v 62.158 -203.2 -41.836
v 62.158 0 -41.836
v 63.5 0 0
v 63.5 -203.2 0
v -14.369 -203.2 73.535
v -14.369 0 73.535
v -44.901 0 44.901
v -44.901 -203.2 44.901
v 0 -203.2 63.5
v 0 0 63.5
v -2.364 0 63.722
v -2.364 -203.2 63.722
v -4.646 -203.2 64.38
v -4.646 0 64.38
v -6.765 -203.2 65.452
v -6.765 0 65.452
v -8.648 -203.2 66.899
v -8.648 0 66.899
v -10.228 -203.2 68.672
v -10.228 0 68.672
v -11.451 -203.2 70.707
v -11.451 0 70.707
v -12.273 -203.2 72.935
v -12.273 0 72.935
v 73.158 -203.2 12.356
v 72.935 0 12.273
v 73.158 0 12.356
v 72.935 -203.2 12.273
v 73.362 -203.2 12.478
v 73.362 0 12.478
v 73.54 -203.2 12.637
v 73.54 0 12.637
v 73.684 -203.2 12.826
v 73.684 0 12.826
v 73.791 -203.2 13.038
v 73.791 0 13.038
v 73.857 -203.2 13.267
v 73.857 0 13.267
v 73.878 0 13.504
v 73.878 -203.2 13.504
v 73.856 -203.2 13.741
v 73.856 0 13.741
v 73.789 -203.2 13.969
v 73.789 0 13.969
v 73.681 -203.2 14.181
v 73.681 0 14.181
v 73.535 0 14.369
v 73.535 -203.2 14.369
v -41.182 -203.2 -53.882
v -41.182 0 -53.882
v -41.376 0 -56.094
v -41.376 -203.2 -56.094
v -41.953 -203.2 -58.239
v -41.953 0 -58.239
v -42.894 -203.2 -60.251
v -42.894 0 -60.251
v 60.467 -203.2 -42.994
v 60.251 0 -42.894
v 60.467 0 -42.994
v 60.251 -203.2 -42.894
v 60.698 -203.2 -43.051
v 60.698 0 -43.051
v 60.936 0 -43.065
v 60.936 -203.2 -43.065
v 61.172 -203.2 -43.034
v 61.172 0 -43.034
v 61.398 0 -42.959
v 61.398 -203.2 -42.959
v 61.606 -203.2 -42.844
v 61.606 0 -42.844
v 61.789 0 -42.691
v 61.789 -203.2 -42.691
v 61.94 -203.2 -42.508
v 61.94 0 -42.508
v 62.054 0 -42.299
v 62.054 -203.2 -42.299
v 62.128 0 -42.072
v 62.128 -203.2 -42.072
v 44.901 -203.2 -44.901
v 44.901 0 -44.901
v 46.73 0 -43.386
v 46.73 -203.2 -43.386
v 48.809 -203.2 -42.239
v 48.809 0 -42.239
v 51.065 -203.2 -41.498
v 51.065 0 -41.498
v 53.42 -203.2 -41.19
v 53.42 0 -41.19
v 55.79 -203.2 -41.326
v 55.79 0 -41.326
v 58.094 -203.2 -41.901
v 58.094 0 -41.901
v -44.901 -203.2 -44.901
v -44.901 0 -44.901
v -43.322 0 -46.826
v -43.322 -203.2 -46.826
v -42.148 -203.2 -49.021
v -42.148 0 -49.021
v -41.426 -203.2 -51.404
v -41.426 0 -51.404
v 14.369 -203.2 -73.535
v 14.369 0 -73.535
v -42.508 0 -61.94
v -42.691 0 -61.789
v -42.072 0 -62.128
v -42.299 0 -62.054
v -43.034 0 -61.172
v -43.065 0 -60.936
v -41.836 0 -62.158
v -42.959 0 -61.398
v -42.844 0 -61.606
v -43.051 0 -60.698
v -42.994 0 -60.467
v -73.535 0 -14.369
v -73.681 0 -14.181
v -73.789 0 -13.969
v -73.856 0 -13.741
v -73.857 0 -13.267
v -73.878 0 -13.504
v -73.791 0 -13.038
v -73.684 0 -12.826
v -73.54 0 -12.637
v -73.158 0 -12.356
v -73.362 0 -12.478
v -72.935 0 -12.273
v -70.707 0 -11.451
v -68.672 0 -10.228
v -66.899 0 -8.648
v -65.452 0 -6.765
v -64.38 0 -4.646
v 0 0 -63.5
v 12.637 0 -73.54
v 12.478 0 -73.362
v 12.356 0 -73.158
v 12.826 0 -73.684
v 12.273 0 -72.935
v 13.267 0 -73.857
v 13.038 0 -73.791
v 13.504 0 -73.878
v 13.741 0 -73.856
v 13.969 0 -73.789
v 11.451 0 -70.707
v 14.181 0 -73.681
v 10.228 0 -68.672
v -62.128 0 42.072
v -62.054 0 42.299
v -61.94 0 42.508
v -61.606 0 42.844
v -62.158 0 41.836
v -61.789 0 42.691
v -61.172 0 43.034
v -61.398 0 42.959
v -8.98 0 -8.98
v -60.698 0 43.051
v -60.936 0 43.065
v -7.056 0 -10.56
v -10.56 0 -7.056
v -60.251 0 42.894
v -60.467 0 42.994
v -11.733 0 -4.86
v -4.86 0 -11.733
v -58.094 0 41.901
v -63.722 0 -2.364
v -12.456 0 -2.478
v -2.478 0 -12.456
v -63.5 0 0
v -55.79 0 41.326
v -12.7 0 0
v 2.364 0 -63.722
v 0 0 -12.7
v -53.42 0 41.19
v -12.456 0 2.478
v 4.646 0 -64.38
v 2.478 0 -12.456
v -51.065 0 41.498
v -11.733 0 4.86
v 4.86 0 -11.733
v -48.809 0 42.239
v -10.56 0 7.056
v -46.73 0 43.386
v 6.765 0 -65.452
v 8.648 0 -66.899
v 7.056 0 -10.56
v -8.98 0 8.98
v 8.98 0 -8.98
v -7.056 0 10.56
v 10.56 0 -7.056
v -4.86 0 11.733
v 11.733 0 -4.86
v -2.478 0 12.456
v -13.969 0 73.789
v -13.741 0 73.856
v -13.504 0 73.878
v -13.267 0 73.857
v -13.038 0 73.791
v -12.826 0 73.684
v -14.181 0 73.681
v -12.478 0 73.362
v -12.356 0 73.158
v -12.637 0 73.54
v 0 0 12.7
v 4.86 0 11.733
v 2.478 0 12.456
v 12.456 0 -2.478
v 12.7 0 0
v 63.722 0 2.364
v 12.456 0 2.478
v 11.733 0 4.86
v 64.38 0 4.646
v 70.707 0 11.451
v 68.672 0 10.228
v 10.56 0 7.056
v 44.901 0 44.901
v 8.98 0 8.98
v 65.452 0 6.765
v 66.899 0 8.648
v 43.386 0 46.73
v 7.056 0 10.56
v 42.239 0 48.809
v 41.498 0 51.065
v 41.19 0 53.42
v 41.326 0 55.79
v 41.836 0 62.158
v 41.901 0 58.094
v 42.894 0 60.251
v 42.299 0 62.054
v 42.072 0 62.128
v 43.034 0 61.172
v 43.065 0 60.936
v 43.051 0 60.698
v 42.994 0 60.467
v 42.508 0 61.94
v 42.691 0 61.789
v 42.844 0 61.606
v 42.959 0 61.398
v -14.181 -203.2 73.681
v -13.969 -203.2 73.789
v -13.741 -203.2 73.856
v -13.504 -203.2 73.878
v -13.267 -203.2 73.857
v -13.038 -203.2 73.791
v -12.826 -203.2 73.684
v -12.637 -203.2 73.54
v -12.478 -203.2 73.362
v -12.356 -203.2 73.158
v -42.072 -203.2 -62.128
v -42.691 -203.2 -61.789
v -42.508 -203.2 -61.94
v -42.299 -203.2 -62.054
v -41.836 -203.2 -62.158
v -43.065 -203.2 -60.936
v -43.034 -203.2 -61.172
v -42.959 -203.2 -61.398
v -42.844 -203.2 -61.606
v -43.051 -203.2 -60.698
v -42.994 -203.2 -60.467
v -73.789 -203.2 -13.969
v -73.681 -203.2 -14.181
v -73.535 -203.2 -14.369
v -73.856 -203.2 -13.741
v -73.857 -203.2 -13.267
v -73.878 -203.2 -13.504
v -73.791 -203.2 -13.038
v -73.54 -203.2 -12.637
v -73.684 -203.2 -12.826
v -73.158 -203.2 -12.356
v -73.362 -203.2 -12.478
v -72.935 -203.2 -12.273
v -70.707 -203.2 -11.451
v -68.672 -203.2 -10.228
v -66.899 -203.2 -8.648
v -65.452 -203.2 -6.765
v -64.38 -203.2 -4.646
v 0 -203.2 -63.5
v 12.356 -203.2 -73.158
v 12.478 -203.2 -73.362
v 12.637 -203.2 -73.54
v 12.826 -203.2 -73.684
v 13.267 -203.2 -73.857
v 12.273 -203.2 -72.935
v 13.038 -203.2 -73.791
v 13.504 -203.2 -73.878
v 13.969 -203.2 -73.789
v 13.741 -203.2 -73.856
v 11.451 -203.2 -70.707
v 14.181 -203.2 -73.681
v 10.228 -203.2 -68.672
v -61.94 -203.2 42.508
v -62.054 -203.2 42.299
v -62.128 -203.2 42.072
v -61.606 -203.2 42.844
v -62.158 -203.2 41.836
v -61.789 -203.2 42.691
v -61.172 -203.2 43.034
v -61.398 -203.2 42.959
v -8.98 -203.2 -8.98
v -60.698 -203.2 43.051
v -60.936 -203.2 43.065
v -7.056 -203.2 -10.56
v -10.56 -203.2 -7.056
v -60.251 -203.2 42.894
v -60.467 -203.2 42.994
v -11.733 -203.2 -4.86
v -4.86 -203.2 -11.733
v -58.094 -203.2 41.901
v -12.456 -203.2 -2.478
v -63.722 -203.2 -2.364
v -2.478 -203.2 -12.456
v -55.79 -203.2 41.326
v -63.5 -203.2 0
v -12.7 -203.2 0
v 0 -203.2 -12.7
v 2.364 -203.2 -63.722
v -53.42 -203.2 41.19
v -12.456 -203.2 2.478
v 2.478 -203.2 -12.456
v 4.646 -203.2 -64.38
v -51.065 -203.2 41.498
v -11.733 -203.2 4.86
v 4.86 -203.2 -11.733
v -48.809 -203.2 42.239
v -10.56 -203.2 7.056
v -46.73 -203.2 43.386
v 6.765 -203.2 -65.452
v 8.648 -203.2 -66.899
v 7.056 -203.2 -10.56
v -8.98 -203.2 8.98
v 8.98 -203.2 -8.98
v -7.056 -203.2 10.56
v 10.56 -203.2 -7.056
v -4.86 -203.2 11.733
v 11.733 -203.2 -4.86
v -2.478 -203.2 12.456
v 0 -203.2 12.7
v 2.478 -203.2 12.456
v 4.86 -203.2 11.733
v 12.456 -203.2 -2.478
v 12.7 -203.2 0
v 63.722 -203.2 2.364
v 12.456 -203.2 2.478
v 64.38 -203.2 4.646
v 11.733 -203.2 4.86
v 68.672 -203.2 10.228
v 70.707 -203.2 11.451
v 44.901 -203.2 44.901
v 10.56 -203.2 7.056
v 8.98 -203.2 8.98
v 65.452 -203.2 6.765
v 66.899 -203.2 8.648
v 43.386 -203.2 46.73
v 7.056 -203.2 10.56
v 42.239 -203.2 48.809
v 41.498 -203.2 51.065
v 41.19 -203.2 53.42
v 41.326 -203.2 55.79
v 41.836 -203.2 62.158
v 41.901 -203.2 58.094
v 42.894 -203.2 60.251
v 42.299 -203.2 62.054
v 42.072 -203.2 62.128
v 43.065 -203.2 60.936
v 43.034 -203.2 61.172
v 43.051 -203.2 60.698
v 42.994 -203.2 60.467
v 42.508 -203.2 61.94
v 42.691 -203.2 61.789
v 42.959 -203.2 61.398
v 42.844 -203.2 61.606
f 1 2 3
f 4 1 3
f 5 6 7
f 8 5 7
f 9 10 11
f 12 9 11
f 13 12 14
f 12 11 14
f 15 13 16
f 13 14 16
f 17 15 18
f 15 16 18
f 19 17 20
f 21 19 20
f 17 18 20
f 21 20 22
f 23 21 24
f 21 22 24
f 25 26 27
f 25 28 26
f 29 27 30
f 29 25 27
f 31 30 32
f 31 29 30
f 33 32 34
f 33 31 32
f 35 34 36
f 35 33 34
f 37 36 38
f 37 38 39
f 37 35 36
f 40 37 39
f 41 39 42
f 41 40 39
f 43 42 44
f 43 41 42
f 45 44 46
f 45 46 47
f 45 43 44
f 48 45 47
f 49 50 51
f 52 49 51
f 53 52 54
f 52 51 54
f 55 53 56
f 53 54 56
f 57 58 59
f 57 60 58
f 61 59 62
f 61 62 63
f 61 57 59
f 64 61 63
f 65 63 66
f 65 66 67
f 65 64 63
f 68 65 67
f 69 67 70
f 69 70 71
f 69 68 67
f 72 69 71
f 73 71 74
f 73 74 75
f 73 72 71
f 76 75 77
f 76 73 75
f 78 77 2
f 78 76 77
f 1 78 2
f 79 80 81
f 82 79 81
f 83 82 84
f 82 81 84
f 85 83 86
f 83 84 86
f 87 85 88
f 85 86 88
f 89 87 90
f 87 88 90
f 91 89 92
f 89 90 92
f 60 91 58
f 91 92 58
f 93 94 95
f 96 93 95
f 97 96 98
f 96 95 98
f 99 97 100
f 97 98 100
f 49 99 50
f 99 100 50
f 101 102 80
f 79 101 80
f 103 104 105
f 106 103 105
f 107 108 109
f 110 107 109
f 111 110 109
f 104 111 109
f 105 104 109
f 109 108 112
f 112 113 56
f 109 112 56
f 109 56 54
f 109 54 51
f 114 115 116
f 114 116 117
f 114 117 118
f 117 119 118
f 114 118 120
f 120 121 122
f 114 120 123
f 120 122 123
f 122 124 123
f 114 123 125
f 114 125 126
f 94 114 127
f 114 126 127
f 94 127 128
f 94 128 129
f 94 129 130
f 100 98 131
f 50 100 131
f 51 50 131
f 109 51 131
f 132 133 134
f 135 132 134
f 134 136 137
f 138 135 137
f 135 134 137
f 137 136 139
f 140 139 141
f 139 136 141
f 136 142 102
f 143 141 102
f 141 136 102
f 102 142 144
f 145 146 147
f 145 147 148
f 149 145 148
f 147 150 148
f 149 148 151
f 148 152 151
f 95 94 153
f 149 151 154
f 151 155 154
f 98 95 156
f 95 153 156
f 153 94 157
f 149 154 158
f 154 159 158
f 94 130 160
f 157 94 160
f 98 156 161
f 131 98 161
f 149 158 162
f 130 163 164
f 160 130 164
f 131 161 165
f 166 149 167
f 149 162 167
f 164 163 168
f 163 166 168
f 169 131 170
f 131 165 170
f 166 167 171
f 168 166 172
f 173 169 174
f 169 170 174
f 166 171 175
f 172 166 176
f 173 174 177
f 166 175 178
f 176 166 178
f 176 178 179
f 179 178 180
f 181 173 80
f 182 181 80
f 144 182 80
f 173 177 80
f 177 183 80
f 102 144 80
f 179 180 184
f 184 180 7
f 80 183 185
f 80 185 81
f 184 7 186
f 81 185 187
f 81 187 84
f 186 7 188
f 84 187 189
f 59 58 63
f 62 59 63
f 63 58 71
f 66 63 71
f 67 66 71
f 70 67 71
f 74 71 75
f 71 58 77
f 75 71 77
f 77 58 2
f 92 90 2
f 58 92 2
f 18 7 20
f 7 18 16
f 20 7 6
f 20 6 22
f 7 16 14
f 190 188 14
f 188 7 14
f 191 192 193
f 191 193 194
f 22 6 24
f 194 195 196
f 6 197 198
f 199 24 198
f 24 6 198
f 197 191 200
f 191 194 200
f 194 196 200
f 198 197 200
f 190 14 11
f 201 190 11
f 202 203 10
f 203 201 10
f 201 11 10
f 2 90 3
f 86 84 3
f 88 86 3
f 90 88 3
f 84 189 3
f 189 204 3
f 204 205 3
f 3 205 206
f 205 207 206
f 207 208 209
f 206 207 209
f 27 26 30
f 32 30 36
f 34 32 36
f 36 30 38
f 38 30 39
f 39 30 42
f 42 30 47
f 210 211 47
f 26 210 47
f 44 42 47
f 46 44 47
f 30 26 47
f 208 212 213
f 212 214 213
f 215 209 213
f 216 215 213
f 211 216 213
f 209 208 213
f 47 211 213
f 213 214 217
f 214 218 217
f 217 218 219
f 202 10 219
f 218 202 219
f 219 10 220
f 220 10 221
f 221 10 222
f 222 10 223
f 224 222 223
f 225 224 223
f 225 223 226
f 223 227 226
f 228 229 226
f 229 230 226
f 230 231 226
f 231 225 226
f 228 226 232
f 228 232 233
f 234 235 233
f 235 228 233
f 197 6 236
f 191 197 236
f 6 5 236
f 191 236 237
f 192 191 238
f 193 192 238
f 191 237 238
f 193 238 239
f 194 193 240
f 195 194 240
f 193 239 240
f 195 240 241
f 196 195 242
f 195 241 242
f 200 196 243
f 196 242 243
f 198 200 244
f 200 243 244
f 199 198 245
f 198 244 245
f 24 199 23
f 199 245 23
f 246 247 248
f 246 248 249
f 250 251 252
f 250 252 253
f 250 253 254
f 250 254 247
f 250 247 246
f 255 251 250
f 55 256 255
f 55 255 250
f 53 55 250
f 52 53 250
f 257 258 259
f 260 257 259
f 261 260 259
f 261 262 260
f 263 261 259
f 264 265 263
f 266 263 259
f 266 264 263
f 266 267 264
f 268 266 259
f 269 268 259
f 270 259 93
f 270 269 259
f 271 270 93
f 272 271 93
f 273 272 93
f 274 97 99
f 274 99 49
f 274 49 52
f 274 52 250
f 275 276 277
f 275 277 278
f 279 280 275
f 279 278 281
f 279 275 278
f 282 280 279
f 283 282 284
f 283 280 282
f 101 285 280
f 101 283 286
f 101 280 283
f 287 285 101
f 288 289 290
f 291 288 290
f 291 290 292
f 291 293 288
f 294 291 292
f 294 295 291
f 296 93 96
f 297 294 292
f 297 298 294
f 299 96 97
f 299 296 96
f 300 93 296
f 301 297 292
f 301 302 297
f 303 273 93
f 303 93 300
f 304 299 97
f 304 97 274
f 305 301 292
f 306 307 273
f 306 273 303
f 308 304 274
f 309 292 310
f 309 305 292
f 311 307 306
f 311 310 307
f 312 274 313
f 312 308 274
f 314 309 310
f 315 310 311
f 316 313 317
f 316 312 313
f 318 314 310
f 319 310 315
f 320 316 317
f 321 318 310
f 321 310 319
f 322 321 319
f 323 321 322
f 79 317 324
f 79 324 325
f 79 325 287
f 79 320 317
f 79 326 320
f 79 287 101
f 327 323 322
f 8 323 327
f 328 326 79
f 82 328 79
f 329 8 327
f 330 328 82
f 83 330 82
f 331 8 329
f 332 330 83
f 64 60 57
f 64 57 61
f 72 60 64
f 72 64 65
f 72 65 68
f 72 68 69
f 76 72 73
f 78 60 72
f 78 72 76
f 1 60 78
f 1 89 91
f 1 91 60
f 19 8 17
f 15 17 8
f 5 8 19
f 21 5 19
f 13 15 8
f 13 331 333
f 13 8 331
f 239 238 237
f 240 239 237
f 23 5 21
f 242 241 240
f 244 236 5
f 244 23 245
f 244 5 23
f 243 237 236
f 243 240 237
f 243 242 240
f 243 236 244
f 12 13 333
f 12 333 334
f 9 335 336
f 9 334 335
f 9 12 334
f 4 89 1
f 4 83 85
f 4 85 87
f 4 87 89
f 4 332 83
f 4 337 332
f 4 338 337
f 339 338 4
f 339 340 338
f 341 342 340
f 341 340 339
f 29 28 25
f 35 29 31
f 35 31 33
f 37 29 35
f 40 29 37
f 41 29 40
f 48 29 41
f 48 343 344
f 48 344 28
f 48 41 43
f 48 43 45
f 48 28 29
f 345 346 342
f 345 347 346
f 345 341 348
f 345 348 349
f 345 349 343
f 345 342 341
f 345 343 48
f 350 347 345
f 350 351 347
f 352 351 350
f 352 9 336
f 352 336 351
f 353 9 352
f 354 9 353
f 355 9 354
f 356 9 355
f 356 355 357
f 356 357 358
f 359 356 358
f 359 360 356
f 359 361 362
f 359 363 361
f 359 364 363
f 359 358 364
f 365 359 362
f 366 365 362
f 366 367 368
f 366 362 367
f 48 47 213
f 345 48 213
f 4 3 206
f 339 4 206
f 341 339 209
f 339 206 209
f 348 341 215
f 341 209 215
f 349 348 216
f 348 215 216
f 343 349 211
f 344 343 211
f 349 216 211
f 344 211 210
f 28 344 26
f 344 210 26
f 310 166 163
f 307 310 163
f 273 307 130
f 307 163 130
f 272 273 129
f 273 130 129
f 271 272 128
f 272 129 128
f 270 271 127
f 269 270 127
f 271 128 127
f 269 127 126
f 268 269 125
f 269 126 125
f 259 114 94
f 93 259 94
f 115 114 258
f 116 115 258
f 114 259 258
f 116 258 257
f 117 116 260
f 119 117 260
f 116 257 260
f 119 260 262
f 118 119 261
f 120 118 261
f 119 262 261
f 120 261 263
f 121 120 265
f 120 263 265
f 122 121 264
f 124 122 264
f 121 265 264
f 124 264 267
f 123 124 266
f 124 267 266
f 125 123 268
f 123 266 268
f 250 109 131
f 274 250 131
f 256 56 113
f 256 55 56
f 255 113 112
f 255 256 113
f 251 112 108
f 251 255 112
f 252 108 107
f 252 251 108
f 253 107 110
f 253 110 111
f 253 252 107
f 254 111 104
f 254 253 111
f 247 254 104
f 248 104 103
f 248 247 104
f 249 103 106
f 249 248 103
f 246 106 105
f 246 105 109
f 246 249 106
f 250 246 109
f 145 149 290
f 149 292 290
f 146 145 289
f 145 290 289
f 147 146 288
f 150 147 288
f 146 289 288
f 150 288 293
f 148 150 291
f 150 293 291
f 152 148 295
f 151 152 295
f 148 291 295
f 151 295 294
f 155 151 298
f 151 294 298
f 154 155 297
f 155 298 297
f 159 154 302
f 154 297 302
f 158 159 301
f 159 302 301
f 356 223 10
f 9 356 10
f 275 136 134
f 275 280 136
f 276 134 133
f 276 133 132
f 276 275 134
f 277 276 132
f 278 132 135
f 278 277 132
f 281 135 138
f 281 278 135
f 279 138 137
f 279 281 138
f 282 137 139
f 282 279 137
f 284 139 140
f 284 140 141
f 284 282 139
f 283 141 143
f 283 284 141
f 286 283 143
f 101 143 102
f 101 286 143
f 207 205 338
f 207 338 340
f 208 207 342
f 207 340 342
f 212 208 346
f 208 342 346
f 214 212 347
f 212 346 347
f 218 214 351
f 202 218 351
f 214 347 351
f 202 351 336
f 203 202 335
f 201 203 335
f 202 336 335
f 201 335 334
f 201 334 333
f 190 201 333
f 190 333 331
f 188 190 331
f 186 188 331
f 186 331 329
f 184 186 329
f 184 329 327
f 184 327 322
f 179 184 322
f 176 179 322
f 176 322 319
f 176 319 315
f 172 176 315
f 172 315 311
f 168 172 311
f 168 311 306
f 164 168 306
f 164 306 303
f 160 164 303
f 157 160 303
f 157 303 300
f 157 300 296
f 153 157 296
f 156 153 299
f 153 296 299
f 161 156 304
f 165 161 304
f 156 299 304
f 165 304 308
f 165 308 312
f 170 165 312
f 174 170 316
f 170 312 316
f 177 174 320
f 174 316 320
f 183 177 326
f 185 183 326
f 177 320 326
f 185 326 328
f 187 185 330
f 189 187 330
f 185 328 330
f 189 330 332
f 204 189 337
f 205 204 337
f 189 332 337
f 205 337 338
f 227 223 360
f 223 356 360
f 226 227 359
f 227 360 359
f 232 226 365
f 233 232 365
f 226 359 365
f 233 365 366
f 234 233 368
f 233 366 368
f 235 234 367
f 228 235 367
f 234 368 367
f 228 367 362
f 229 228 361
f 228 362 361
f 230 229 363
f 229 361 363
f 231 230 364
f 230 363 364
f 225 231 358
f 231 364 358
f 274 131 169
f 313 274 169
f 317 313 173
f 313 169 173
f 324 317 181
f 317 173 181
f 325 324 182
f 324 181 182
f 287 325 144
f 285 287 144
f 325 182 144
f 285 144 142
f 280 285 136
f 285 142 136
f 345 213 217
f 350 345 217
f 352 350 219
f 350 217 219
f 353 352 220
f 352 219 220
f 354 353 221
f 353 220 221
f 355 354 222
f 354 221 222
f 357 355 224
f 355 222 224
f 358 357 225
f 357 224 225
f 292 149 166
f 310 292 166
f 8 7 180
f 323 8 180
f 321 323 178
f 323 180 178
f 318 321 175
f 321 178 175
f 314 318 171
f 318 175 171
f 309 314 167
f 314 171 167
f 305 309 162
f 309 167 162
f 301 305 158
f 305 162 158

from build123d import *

# Parameters (mm, degrees)
F1_DEPTH = 203.2
F2_R     = 12.7
F3_DEPTH = 203.201
F4_R     = 1.27


with BuildPart() as f1:
    # F0 (on Front) → F1 (new body)
    with BuildSketch(Plane.XZ):
        with BuildLine():
            Line((44.901281, -44.901281), (0, 0))
            Line((0, 0), (-44.901281, -44.901281))
            ThreePointArc((-44.901281, -44.901281), (-42.148267, -49.021457), (-41.181537, -53.881537))
            ThreePointArc((-41.181537, -53.881537), (-41.955794, -58.248076), (-44.184162, -62.082202))
            Line((-44.184162, -62.082202), (0, -63.5))
            ThreePointArc((0, -63.5), (8.597941, -66.853053), (12.655826, -75.141667))
            Line((12.655826, -75.141667), (44.901281, -44.901281))
        make_face()
        with BuildLine():
            ThreePointArc((63.5, 0), (66.853053, 8.597941), (75.141667, 12.655826))
            Line((75.141667, 12.655826), (44.901281, 44.901281))
            Line((44.901281, 44.901281), (0, 0))
            Line((0, 0), (44.901281, -44.901281))
            ThreePointArc((44.901281, -44.901281), (53.351909, -41.192585), (62.082202, -44.184162))
            Line((62.082202, -44.184162), (63.5, 0))
        make_face()
        with BuildLine():
            Line((0, 0), (44.901281, 44.901281))
            ThreePointArc((44.901281, 44.901281), (41.192585, 53.351909), (44.184162, 62.082202))
            Line((44.184162, 62.082202), (0, 63.5))
            ThreePointArc((0, 63.5), (-8.597941, 66.853053), (-12.655826, 75.141667))
            Line((-12.655826, 75.141667), (-44.901281, 44.901281))
            Line((-44.901281, 44.901281), (0, 0))
        make_face()
        with BuildLine():
            Line((-44.901281, -44.901281), (0, 0))
            Line((0, 0), (-44.901281, 44.901281))
            ThreePointArc((-44.901281, 44.901281), (-53.351909, 41.192585), (-62.082202, 44.184162))
            Line((-62.082202, 44.184162), (-63.5, 0))
            ThreePointArc((-63.5, 0), (-66.853053, -8.597941), (-75.141667, -12.655826))
            Line((-75.141667, -12.655826), (-44.901281, -44.901281))
        make_face()
    extrude(amount=F1_DEPTH)

    # F2 (on face) → F3 (cut, through all)
    with BuildSketch(Plane.XZ.offset(203.2)):
        Circle(F2_R)
    extrude(amount=-F3_DEPTH, mode=Mode.SUBTRACT)

    # F4
    f4_edges = [f1.edges().sort_by_distance(p)[0] for p in [
        (-12.655826, -101.6, 75.141667),
        (44.184162, -101.6, 62.082202),
        (-62.082202, -101.6, 44.184162),
        (-75.141667, -101.6, -12.655826),
        (-44.184162, -101.6, -62.082202),
        (12.655826, -101.6, -75.141667),
        (62.082202, -101.6, -44.184162),
        (75.141667, -101.6, 12.655826),
    ]]
    fillet(f4_edges, radius=F4_R)


solid = f1.part
